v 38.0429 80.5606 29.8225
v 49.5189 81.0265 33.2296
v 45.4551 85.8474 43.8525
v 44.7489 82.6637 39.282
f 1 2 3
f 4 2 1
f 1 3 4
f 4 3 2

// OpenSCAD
// Auto-generated auxetic polyhedron
points = [
    [45.455094, 85.847391, 43.852456],
    [49.518870, 81.026492, 33.229629],
    [38.042934, 80.560622, 29.822539],
    [44.748864, 82.663753, 39.281985],
];

faces = [
    [0, 1, 2],
    [2, 1, 3],
    [3, 0, 2],
    [1, 0, 3],
];

polyhedron(points = points, faces = faces);
